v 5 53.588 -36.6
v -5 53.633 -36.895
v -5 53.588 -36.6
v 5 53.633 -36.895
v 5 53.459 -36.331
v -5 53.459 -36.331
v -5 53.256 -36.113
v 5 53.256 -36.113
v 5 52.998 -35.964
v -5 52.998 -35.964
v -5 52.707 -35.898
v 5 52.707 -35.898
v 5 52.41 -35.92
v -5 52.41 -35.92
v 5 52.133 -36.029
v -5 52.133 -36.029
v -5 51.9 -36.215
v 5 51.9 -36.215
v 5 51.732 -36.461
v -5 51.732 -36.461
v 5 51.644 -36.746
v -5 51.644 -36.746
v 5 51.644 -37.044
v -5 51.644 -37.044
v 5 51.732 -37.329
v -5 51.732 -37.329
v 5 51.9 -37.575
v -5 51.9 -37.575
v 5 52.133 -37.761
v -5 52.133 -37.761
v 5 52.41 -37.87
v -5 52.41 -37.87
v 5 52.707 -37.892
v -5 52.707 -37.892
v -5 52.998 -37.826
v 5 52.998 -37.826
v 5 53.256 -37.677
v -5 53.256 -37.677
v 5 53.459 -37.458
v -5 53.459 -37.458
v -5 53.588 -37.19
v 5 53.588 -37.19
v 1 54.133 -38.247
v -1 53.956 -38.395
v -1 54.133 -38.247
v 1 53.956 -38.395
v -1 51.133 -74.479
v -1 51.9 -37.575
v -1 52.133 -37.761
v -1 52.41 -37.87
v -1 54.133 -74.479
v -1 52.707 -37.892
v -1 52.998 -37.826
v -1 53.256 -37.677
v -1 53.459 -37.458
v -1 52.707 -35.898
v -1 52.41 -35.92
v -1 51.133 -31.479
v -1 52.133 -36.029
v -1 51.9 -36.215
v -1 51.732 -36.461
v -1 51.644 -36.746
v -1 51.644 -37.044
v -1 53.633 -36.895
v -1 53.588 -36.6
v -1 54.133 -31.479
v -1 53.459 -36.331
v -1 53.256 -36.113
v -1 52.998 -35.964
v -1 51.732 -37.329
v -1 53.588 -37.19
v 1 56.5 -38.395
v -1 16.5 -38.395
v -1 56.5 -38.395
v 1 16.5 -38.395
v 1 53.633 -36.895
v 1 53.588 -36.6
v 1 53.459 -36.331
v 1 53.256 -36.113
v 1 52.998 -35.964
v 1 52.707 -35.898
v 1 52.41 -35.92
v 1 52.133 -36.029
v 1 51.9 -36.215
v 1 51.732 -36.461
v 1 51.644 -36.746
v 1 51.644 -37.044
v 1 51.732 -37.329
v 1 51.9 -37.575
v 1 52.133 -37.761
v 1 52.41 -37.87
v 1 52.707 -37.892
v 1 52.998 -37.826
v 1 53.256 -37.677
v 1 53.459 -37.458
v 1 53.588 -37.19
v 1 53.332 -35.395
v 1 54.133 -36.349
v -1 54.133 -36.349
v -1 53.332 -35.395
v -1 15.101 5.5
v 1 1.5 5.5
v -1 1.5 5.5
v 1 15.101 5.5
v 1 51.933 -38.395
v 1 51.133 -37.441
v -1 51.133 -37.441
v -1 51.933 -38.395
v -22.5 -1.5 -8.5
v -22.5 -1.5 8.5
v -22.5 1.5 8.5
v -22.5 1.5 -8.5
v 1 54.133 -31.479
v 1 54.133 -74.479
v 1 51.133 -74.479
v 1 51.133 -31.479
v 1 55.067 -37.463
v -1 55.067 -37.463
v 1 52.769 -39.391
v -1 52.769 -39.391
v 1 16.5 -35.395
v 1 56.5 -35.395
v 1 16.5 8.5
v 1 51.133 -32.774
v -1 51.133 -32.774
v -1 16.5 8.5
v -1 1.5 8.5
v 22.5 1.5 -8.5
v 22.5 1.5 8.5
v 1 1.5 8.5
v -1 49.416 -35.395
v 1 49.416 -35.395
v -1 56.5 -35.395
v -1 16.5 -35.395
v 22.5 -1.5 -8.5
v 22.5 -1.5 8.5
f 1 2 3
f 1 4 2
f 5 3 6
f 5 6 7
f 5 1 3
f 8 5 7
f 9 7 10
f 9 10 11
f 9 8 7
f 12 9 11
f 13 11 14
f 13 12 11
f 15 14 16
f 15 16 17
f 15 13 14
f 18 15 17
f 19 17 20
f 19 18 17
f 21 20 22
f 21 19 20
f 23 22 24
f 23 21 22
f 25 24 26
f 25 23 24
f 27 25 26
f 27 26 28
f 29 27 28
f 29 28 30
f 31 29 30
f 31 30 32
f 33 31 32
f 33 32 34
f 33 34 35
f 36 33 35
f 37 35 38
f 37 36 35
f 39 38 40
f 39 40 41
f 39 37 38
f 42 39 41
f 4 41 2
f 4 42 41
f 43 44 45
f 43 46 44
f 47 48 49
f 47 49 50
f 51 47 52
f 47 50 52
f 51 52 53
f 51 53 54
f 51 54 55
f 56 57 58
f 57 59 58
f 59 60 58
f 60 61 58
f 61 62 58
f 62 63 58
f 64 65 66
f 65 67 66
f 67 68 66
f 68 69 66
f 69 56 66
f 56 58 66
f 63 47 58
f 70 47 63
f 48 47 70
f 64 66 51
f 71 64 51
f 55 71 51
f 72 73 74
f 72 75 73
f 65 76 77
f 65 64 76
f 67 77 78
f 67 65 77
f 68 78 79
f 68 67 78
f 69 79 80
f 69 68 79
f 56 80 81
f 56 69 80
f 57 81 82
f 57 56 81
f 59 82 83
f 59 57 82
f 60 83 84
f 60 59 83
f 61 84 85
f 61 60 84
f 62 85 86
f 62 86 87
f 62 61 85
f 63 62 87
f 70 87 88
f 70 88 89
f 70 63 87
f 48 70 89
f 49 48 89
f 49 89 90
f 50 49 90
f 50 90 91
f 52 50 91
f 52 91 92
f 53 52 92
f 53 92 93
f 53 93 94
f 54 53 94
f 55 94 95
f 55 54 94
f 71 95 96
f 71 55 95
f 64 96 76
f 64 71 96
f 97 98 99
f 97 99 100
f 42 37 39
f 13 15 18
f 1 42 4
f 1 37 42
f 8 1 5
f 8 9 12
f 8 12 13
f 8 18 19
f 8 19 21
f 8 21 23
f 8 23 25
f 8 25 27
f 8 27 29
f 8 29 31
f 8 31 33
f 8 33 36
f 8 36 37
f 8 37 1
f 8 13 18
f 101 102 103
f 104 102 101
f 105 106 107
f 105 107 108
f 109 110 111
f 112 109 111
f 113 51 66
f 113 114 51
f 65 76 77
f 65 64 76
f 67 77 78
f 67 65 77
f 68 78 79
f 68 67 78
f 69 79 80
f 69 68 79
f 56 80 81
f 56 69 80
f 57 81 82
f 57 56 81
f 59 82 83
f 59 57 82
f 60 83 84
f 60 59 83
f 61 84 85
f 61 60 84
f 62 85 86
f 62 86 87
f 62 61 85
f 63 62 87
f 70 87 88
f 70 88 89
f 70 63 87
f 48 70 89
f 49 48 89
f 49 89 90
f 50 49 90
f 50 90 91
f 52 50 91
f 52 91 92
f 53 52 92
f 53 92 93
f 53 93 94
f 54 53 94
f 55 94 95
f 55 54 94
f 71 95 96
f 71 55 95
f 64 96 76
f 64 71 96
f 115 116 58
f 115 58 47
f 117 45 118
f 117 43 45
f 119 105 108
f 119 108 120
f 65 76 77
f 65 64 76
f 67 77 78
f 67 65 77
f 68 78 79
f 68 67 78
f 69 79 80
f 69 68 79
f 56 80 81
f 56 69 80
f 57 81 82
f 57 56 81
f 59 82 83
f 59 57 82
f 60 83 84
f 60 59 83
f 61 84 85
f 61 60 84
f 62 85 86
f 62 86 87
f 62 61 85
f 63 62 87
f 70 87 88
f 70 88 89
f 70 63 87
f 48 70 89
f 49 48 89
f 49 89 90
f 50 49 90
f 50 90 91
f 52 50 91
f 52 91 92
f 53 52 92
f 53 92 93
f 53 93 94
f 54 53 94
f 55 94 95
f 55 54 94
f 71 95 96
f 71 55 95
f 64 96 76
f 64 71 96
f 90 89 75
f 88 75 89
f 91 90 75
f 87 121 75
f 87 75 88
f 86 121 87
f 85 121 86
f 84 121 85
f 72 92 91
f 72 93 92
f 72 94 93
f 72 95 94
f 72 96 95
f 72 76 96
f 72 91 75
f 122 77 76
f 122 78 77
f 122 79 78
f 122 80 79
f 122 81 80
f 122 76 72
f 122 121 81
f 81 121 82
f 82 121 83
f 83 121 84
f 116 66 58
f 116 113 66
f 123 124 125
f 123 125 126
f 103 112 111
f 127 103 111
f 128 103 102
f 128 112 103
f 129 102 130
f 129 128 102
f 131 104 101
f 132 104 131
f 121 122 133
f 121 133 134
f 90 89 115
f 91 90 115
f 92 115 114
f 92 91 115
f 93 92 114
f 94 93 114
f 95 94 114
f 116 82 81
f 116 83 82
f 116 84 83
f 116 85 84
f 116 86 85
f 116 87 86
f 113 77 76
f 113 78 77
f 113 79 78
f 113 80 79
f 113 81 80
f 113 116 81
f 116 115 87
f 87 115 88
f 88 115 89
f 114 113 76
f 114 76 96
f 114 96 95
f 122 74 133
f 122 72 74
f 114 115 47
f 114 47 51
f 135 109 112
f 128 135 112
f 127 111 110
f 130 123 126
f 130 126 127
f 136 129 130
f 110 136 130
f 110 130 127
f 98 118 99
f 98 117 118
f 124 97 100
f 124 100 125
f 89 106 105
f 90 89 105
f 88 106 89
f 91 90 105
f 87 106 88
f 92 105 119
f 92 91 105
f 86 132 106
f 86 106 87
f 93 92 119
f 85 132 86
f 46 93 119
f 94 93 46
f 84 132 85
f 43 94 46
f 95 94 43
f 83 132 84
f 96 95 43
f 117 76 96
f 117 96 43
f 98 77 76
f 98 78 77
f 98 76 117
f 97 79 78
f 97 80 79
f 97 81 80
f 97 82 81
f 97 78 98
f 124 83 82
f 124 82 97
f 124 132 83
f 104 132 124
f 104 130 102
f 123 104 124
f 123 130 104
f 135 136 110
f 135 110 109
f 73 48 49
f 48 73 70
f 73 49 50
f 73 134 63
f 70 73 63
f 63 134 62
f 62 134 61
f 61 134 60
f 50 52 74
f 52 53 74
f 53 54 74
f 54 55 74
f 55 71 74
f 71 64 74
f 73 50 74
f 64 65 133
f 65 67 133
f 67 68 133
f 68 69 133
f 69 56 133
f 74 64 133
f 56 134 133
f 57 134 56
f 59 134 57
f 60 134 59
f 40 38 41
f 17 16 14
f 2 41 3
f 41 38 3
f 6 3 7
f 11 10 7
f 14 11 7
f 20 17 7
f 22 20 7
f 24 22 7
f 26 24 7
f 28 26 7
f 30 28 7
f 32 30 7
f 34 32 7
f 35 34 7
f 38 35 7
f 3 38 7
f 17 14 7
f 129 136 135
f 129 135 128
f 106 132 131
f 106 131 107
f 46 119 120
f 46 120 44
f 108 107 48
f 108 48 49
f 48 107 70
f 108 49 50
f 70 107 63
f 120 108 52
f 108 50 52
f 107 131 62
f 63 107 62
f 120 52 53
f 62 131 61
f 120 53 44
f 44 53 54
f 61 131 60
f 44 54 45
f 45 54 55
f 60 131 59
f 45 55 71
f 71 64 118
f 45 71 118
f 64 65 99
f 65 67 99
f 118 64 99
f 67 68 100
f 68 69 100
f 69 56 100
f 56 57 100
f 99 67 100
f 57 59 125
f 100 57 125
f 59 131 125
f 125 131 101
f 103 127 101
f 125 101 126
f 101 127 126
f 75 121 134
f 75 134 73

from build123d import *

# Parameters (mm, degrees)
F0_R     = 1
F1_DEPTH = 1
F2_DEPTH = 1
F3_DEPTH = 1
F4_DEPTH = 22.5
F5_DEPTH = 5


with BuildPart() as f1:
    # F0 (on Right) → F1 (new body, symmetric)
    with BuildSketch(Plane.YZ):
        Polygon((51.1326146971, -37.4407144668), (49.4158543164, -35.3947591154), (16.5, -35.3947591154), (16.5, -38.3947591154), (51.1326146971, -38.3947591154), align=None)
        Polygon((51.1326146971, -35.3947591154), (49.4158543164, -35.3947591154), (51.1326146971, -37.4407144668), align=None)
        Polygon((54.1326146971, -36.348803764), (53.3320761844, -35.3947591154), (51.1326146971, -35.3947591154), (51.1326146971, -37.4407144668), (51.9331532099, -38.3947591154), (53.956431962, -38.3947591154), (54.1326146971, -38.2469242473), align=None)
        with Locations((52.6326146971, -36.8947591154)):
            Circle(F0_R, mode=Mode.SUBTRACT)
        Polygon((51.9331532099, -38.3947591154), (51.1326146971, -37.4407144668), (51.1326146971, -38.3947591154), align=None)
        Polygon((54.1326146971, -35.3947591154), (53.3320761844, -35.3947591154), (54.1326146971, -36.348803764), align=None)
        Polygon((54.1326146971, -35.3947591154), (54.1326146971, -36.348803764), (55.0672565812, -37.4626665871), (54.1326146971, -38.2469242473), (54.1326146971, -38.3947591154), (56.5, -38.3947591154), (56.5, -35.3947591154), align=None)
        Polygon((55.0672565812, -37.4626665871), (54.1326146971, -36.348803764), (54.1326146971, -38.2469242473), align=None)
        Polygon((54.1326146971, -38.3947591154), (54.1326146971, -38.2469242473), (53.956431962, -38.3947591154), align=None)
    extrude(amount=F1_DEPTH, both=True)


with BuildPart() as f2:
    # F0 (on Right) → F2 (new body, symmetric)
    with BuildSketch(Plane.YZ):
        Polygon((51.1326146971, -31.4790881872), (51.1326146971, -32.7735429862), (53.3320761844, -35.3947591154), (54.1326146971, -35.3947591154), (54.1326146971, -31.4790881872), align=None)
        Polygon((53.3320761844, -35.3947591154), (51.1326146971, -32.7735429862), (51.1326146971, -35.3947591154), align=None)
        Polygon((54.1326146971, -36.348803764), (53.3320761844, -35.3947591154), (51.1326146971, -35.3947591154), (51.1326146971, -37.4407144668), (51.9331532099, -38.3947591154), (53.956431962, -38.3947591154), (54.1326146971, -38.2469242473), align=None)
        with Locations((52.6326146971, -36.8947591154)):
            Circle(F0_R, mode=Mode.SUBTRACT)
        Polygon((51.9331532099, -38.3947591154), (51.1326146971, -37.4407144668), (51.1326146971, -38.3947591154), align=None)
        Polygon((54.1326146971, -35.3947591154), (53.3320761844, -35.3947591154), (54.1326146971, -36.348803764), align=None)
        Polygon((52.7691232518, -39.3910294162), (51.9331532099, -38.3947591154), (51.1326146971, -38.3947591154), (51.1326146971, -74.4790881872), (54.1326146971, -74.4790881872), (54.1326146971, -38.3947591154), (53.956431962, -38.3947591154), align=None)
        Polygon((53.956431962, -38.3947591154), (51.9331532099, -38.3947591154), (52.7691232518, -39.3910294162), align=None)
        Polygon((54.1326146971, -38.3947591154), (54.1326146971, -38.2469242473), (53.956431962, -38.3947591154), align=None)
    extrude(amount=F2_DEPTH, both=True)


with BuildPart() as f3:
    # F0 (on Right) → F3 (new body, symmetric)
    with BuildSketch(Plane.YZ):
        Polygon((55.0672565812, -37.4626665871), (54.1326146971, -36.348803764), (54.1326146971, -38.2469242473), align=None)
        Polygon((53.956431962, -38.3947591154), (51.9331532099, -38.3947591154), (52.7691232518, -39.3910294162), align=None)
        Polygon((54.1326146971, -36.348803764), (53.3320761844, -35.3947591154), (51.1326146971, -35.3947591154), (51.1326146971, -37.4407144668), (51.9331532099, -38.3947591154), (53.956431962, -38.3947591154), (54.1326146971, -38.2469242473), align=None)
        with Locations((52.6326146971, -36.8947591154)):
            Circle(F0_R, mode=Mode.SUBTRACT)
        Polygon((53.3320761844, -35.3947591154), (51.1326146971, -32.7735429862), (51.1326146971, -35.3947591154), align=None)
        Polygon((51.1326146971, -35.3947591154), (49.4158543164, -35.3947591154), (51.1326146971, -37.4407144668), align=None)
        Polygon((51.1326146971, -32.7735429862), (16.5, 8.5), (16.5, 5.5), (15.1010770255, 5.5), (49.4158543164, -35.3947591154), (51.1326146971, -35.3947591154), align=None)
        Polygon((16.5, 8.5), (1.5, 8.5), (1.5, 5.5), (15.1010770255, 5.5), (16.5, 5.5), align=None)
    extrude(amount=F3_DEPTH, both=True)

    # F0 (on Right) → F4 (join, symmetric)
    with BuildSketch(Plane.YZ):
        Polygon((1.5, 8.5), (-1.5, 8.5), (-1.5, -8.5), (1.5, -8.5), (1.5, 5.5), align=None)
    extrude(amount=F4_DEPTH, both=True)


with BuildPart() as f5:
    # F0 (on Right) → F5 (new body, symmetric)
    with BuildSketch(Plane.YZ):
        with Locations((52.6326146971, -36.8947591154)):
            Circle(F0_R)
    extrude(amount=F5_DEPTH, both=True)


solid = Compound([f1.part, f2.part, f3.part, f5.part])
